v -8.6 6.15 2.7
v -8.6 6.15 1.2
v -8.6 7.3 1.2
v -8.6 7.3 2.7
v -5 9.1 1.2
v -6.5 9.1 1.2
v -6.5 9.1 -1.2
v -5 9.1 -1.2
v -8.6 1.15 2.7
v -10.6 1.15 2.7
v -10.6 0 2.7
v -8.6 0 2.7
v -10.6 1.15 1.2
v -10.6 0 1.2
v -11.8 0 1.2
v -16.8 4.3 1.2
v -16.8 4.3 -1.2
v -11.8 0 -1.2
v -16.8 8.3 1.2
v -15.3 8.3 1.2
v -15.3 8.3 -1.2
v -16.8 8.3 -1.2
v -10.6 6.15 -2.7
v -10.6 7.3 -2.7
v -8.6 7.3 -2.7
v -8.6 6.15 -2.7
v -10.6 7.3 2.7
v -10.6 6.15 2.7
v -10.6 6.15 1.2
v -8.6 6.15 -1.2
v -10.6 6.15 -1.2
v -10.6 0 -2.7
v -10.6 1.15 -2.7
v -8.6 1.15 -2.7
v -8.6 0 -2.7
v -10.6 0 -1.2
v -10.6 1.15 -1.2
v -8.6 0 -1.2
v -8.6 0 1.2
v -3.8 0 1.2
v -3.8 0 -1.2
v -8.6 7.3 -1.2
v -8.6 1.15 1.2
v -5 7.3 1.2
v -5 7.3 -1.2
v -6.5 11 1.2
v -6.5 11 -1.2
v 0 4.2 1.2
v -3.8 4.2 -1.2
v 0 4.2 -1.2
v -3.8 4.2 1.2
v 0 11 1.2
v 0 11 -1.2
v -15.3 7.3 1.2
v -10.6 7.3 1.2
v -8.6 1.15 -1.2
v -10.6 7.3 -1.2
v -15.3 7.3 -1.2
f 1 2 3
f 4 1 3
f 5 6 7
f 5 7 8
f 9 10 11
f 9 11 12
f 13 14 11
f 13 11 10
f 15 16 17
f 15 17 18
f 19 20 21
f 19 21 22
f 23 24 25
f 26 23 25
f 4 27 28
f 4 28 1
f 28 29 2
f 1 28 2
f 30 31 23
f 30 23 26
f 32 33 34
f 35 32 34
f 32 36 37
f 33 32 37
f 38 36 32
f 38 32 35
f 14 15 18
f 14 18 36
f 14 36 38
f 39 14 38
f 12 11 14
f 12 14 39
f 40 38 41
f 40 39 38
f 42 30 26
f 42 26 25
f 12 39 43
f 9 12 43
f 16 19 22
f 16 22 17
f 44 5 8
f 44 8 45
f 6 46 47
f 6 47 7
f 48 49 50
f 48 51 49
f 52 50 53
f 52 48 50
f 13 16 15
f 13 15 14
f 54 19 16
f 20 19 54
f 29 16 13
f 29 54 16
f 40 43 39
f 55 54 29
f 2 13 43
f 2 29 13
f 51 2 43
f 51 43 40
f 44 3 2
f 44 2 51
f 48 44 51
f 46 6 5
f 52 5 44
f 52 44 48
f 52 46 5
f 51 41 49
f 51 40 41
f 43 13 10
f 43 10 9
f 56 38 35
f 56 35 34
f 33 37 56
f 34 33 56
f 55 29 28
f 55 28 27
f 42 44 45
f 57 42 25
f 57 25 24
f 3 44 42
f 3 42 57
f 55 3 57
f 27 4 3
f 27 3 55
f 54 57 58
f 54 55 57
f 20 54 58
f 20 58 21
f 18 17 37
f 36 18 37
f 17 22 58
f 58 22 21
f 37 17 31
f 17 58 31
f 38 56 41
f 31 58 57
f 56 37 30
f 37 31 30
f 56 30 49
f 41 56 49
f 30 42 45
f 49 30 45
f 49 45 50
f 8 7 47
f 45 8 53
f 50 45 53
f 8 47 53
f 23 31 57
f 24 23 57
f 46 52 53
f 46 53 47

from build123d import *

# Parameters (mm, degrees)
F1_DEPTH = 1.2
F2_W     = 2
F2_H     = 1.15
F3_DEPTH = 1.5


# Not quite as in the source:
# - a pattern or mirror of a feature is missing from the dataset's text; its kind, count and spacing are read off the source's solid


with BuildPart() as f1:
    # F0 (on Top) → F1 (new body, symmetric)
    with BuildSketch(Plane.XY):
        Polygon((0, 4.2), (0, 11), (-6.5, 11), (-6.5, 9.1), (-5, 9.1), (-5, 7.3), (-15.3, 7.3), (-15.3, 8.3), (-16.8, 8.3), (-16.8, 4.3), (-11.8, 0), (-3.8, 0), (-3.8, 4.2), align=None)
    extrude(amount=F1_DEPTH, both=True)

    # F2 (on face) → F3 (join)
    with BuildSketch(Plane.XY.offset(1.2)):
        with Locations((-9.6, 0.575)):
            Rectangle(F2_W, F2_H)
        with Locations((-9.6, 6.725)):
            Rectangle(F2_W, F2_H)
    f3 = extrude(amount=F3_DEPTH)

    # F3_copies: F3 across plane
    add(f3.mirror(Plane(origin=(0, 0, 0), x_dir=(-1, 0, 0), z_dir=(0, 0, -1))))


solid = f1.part
